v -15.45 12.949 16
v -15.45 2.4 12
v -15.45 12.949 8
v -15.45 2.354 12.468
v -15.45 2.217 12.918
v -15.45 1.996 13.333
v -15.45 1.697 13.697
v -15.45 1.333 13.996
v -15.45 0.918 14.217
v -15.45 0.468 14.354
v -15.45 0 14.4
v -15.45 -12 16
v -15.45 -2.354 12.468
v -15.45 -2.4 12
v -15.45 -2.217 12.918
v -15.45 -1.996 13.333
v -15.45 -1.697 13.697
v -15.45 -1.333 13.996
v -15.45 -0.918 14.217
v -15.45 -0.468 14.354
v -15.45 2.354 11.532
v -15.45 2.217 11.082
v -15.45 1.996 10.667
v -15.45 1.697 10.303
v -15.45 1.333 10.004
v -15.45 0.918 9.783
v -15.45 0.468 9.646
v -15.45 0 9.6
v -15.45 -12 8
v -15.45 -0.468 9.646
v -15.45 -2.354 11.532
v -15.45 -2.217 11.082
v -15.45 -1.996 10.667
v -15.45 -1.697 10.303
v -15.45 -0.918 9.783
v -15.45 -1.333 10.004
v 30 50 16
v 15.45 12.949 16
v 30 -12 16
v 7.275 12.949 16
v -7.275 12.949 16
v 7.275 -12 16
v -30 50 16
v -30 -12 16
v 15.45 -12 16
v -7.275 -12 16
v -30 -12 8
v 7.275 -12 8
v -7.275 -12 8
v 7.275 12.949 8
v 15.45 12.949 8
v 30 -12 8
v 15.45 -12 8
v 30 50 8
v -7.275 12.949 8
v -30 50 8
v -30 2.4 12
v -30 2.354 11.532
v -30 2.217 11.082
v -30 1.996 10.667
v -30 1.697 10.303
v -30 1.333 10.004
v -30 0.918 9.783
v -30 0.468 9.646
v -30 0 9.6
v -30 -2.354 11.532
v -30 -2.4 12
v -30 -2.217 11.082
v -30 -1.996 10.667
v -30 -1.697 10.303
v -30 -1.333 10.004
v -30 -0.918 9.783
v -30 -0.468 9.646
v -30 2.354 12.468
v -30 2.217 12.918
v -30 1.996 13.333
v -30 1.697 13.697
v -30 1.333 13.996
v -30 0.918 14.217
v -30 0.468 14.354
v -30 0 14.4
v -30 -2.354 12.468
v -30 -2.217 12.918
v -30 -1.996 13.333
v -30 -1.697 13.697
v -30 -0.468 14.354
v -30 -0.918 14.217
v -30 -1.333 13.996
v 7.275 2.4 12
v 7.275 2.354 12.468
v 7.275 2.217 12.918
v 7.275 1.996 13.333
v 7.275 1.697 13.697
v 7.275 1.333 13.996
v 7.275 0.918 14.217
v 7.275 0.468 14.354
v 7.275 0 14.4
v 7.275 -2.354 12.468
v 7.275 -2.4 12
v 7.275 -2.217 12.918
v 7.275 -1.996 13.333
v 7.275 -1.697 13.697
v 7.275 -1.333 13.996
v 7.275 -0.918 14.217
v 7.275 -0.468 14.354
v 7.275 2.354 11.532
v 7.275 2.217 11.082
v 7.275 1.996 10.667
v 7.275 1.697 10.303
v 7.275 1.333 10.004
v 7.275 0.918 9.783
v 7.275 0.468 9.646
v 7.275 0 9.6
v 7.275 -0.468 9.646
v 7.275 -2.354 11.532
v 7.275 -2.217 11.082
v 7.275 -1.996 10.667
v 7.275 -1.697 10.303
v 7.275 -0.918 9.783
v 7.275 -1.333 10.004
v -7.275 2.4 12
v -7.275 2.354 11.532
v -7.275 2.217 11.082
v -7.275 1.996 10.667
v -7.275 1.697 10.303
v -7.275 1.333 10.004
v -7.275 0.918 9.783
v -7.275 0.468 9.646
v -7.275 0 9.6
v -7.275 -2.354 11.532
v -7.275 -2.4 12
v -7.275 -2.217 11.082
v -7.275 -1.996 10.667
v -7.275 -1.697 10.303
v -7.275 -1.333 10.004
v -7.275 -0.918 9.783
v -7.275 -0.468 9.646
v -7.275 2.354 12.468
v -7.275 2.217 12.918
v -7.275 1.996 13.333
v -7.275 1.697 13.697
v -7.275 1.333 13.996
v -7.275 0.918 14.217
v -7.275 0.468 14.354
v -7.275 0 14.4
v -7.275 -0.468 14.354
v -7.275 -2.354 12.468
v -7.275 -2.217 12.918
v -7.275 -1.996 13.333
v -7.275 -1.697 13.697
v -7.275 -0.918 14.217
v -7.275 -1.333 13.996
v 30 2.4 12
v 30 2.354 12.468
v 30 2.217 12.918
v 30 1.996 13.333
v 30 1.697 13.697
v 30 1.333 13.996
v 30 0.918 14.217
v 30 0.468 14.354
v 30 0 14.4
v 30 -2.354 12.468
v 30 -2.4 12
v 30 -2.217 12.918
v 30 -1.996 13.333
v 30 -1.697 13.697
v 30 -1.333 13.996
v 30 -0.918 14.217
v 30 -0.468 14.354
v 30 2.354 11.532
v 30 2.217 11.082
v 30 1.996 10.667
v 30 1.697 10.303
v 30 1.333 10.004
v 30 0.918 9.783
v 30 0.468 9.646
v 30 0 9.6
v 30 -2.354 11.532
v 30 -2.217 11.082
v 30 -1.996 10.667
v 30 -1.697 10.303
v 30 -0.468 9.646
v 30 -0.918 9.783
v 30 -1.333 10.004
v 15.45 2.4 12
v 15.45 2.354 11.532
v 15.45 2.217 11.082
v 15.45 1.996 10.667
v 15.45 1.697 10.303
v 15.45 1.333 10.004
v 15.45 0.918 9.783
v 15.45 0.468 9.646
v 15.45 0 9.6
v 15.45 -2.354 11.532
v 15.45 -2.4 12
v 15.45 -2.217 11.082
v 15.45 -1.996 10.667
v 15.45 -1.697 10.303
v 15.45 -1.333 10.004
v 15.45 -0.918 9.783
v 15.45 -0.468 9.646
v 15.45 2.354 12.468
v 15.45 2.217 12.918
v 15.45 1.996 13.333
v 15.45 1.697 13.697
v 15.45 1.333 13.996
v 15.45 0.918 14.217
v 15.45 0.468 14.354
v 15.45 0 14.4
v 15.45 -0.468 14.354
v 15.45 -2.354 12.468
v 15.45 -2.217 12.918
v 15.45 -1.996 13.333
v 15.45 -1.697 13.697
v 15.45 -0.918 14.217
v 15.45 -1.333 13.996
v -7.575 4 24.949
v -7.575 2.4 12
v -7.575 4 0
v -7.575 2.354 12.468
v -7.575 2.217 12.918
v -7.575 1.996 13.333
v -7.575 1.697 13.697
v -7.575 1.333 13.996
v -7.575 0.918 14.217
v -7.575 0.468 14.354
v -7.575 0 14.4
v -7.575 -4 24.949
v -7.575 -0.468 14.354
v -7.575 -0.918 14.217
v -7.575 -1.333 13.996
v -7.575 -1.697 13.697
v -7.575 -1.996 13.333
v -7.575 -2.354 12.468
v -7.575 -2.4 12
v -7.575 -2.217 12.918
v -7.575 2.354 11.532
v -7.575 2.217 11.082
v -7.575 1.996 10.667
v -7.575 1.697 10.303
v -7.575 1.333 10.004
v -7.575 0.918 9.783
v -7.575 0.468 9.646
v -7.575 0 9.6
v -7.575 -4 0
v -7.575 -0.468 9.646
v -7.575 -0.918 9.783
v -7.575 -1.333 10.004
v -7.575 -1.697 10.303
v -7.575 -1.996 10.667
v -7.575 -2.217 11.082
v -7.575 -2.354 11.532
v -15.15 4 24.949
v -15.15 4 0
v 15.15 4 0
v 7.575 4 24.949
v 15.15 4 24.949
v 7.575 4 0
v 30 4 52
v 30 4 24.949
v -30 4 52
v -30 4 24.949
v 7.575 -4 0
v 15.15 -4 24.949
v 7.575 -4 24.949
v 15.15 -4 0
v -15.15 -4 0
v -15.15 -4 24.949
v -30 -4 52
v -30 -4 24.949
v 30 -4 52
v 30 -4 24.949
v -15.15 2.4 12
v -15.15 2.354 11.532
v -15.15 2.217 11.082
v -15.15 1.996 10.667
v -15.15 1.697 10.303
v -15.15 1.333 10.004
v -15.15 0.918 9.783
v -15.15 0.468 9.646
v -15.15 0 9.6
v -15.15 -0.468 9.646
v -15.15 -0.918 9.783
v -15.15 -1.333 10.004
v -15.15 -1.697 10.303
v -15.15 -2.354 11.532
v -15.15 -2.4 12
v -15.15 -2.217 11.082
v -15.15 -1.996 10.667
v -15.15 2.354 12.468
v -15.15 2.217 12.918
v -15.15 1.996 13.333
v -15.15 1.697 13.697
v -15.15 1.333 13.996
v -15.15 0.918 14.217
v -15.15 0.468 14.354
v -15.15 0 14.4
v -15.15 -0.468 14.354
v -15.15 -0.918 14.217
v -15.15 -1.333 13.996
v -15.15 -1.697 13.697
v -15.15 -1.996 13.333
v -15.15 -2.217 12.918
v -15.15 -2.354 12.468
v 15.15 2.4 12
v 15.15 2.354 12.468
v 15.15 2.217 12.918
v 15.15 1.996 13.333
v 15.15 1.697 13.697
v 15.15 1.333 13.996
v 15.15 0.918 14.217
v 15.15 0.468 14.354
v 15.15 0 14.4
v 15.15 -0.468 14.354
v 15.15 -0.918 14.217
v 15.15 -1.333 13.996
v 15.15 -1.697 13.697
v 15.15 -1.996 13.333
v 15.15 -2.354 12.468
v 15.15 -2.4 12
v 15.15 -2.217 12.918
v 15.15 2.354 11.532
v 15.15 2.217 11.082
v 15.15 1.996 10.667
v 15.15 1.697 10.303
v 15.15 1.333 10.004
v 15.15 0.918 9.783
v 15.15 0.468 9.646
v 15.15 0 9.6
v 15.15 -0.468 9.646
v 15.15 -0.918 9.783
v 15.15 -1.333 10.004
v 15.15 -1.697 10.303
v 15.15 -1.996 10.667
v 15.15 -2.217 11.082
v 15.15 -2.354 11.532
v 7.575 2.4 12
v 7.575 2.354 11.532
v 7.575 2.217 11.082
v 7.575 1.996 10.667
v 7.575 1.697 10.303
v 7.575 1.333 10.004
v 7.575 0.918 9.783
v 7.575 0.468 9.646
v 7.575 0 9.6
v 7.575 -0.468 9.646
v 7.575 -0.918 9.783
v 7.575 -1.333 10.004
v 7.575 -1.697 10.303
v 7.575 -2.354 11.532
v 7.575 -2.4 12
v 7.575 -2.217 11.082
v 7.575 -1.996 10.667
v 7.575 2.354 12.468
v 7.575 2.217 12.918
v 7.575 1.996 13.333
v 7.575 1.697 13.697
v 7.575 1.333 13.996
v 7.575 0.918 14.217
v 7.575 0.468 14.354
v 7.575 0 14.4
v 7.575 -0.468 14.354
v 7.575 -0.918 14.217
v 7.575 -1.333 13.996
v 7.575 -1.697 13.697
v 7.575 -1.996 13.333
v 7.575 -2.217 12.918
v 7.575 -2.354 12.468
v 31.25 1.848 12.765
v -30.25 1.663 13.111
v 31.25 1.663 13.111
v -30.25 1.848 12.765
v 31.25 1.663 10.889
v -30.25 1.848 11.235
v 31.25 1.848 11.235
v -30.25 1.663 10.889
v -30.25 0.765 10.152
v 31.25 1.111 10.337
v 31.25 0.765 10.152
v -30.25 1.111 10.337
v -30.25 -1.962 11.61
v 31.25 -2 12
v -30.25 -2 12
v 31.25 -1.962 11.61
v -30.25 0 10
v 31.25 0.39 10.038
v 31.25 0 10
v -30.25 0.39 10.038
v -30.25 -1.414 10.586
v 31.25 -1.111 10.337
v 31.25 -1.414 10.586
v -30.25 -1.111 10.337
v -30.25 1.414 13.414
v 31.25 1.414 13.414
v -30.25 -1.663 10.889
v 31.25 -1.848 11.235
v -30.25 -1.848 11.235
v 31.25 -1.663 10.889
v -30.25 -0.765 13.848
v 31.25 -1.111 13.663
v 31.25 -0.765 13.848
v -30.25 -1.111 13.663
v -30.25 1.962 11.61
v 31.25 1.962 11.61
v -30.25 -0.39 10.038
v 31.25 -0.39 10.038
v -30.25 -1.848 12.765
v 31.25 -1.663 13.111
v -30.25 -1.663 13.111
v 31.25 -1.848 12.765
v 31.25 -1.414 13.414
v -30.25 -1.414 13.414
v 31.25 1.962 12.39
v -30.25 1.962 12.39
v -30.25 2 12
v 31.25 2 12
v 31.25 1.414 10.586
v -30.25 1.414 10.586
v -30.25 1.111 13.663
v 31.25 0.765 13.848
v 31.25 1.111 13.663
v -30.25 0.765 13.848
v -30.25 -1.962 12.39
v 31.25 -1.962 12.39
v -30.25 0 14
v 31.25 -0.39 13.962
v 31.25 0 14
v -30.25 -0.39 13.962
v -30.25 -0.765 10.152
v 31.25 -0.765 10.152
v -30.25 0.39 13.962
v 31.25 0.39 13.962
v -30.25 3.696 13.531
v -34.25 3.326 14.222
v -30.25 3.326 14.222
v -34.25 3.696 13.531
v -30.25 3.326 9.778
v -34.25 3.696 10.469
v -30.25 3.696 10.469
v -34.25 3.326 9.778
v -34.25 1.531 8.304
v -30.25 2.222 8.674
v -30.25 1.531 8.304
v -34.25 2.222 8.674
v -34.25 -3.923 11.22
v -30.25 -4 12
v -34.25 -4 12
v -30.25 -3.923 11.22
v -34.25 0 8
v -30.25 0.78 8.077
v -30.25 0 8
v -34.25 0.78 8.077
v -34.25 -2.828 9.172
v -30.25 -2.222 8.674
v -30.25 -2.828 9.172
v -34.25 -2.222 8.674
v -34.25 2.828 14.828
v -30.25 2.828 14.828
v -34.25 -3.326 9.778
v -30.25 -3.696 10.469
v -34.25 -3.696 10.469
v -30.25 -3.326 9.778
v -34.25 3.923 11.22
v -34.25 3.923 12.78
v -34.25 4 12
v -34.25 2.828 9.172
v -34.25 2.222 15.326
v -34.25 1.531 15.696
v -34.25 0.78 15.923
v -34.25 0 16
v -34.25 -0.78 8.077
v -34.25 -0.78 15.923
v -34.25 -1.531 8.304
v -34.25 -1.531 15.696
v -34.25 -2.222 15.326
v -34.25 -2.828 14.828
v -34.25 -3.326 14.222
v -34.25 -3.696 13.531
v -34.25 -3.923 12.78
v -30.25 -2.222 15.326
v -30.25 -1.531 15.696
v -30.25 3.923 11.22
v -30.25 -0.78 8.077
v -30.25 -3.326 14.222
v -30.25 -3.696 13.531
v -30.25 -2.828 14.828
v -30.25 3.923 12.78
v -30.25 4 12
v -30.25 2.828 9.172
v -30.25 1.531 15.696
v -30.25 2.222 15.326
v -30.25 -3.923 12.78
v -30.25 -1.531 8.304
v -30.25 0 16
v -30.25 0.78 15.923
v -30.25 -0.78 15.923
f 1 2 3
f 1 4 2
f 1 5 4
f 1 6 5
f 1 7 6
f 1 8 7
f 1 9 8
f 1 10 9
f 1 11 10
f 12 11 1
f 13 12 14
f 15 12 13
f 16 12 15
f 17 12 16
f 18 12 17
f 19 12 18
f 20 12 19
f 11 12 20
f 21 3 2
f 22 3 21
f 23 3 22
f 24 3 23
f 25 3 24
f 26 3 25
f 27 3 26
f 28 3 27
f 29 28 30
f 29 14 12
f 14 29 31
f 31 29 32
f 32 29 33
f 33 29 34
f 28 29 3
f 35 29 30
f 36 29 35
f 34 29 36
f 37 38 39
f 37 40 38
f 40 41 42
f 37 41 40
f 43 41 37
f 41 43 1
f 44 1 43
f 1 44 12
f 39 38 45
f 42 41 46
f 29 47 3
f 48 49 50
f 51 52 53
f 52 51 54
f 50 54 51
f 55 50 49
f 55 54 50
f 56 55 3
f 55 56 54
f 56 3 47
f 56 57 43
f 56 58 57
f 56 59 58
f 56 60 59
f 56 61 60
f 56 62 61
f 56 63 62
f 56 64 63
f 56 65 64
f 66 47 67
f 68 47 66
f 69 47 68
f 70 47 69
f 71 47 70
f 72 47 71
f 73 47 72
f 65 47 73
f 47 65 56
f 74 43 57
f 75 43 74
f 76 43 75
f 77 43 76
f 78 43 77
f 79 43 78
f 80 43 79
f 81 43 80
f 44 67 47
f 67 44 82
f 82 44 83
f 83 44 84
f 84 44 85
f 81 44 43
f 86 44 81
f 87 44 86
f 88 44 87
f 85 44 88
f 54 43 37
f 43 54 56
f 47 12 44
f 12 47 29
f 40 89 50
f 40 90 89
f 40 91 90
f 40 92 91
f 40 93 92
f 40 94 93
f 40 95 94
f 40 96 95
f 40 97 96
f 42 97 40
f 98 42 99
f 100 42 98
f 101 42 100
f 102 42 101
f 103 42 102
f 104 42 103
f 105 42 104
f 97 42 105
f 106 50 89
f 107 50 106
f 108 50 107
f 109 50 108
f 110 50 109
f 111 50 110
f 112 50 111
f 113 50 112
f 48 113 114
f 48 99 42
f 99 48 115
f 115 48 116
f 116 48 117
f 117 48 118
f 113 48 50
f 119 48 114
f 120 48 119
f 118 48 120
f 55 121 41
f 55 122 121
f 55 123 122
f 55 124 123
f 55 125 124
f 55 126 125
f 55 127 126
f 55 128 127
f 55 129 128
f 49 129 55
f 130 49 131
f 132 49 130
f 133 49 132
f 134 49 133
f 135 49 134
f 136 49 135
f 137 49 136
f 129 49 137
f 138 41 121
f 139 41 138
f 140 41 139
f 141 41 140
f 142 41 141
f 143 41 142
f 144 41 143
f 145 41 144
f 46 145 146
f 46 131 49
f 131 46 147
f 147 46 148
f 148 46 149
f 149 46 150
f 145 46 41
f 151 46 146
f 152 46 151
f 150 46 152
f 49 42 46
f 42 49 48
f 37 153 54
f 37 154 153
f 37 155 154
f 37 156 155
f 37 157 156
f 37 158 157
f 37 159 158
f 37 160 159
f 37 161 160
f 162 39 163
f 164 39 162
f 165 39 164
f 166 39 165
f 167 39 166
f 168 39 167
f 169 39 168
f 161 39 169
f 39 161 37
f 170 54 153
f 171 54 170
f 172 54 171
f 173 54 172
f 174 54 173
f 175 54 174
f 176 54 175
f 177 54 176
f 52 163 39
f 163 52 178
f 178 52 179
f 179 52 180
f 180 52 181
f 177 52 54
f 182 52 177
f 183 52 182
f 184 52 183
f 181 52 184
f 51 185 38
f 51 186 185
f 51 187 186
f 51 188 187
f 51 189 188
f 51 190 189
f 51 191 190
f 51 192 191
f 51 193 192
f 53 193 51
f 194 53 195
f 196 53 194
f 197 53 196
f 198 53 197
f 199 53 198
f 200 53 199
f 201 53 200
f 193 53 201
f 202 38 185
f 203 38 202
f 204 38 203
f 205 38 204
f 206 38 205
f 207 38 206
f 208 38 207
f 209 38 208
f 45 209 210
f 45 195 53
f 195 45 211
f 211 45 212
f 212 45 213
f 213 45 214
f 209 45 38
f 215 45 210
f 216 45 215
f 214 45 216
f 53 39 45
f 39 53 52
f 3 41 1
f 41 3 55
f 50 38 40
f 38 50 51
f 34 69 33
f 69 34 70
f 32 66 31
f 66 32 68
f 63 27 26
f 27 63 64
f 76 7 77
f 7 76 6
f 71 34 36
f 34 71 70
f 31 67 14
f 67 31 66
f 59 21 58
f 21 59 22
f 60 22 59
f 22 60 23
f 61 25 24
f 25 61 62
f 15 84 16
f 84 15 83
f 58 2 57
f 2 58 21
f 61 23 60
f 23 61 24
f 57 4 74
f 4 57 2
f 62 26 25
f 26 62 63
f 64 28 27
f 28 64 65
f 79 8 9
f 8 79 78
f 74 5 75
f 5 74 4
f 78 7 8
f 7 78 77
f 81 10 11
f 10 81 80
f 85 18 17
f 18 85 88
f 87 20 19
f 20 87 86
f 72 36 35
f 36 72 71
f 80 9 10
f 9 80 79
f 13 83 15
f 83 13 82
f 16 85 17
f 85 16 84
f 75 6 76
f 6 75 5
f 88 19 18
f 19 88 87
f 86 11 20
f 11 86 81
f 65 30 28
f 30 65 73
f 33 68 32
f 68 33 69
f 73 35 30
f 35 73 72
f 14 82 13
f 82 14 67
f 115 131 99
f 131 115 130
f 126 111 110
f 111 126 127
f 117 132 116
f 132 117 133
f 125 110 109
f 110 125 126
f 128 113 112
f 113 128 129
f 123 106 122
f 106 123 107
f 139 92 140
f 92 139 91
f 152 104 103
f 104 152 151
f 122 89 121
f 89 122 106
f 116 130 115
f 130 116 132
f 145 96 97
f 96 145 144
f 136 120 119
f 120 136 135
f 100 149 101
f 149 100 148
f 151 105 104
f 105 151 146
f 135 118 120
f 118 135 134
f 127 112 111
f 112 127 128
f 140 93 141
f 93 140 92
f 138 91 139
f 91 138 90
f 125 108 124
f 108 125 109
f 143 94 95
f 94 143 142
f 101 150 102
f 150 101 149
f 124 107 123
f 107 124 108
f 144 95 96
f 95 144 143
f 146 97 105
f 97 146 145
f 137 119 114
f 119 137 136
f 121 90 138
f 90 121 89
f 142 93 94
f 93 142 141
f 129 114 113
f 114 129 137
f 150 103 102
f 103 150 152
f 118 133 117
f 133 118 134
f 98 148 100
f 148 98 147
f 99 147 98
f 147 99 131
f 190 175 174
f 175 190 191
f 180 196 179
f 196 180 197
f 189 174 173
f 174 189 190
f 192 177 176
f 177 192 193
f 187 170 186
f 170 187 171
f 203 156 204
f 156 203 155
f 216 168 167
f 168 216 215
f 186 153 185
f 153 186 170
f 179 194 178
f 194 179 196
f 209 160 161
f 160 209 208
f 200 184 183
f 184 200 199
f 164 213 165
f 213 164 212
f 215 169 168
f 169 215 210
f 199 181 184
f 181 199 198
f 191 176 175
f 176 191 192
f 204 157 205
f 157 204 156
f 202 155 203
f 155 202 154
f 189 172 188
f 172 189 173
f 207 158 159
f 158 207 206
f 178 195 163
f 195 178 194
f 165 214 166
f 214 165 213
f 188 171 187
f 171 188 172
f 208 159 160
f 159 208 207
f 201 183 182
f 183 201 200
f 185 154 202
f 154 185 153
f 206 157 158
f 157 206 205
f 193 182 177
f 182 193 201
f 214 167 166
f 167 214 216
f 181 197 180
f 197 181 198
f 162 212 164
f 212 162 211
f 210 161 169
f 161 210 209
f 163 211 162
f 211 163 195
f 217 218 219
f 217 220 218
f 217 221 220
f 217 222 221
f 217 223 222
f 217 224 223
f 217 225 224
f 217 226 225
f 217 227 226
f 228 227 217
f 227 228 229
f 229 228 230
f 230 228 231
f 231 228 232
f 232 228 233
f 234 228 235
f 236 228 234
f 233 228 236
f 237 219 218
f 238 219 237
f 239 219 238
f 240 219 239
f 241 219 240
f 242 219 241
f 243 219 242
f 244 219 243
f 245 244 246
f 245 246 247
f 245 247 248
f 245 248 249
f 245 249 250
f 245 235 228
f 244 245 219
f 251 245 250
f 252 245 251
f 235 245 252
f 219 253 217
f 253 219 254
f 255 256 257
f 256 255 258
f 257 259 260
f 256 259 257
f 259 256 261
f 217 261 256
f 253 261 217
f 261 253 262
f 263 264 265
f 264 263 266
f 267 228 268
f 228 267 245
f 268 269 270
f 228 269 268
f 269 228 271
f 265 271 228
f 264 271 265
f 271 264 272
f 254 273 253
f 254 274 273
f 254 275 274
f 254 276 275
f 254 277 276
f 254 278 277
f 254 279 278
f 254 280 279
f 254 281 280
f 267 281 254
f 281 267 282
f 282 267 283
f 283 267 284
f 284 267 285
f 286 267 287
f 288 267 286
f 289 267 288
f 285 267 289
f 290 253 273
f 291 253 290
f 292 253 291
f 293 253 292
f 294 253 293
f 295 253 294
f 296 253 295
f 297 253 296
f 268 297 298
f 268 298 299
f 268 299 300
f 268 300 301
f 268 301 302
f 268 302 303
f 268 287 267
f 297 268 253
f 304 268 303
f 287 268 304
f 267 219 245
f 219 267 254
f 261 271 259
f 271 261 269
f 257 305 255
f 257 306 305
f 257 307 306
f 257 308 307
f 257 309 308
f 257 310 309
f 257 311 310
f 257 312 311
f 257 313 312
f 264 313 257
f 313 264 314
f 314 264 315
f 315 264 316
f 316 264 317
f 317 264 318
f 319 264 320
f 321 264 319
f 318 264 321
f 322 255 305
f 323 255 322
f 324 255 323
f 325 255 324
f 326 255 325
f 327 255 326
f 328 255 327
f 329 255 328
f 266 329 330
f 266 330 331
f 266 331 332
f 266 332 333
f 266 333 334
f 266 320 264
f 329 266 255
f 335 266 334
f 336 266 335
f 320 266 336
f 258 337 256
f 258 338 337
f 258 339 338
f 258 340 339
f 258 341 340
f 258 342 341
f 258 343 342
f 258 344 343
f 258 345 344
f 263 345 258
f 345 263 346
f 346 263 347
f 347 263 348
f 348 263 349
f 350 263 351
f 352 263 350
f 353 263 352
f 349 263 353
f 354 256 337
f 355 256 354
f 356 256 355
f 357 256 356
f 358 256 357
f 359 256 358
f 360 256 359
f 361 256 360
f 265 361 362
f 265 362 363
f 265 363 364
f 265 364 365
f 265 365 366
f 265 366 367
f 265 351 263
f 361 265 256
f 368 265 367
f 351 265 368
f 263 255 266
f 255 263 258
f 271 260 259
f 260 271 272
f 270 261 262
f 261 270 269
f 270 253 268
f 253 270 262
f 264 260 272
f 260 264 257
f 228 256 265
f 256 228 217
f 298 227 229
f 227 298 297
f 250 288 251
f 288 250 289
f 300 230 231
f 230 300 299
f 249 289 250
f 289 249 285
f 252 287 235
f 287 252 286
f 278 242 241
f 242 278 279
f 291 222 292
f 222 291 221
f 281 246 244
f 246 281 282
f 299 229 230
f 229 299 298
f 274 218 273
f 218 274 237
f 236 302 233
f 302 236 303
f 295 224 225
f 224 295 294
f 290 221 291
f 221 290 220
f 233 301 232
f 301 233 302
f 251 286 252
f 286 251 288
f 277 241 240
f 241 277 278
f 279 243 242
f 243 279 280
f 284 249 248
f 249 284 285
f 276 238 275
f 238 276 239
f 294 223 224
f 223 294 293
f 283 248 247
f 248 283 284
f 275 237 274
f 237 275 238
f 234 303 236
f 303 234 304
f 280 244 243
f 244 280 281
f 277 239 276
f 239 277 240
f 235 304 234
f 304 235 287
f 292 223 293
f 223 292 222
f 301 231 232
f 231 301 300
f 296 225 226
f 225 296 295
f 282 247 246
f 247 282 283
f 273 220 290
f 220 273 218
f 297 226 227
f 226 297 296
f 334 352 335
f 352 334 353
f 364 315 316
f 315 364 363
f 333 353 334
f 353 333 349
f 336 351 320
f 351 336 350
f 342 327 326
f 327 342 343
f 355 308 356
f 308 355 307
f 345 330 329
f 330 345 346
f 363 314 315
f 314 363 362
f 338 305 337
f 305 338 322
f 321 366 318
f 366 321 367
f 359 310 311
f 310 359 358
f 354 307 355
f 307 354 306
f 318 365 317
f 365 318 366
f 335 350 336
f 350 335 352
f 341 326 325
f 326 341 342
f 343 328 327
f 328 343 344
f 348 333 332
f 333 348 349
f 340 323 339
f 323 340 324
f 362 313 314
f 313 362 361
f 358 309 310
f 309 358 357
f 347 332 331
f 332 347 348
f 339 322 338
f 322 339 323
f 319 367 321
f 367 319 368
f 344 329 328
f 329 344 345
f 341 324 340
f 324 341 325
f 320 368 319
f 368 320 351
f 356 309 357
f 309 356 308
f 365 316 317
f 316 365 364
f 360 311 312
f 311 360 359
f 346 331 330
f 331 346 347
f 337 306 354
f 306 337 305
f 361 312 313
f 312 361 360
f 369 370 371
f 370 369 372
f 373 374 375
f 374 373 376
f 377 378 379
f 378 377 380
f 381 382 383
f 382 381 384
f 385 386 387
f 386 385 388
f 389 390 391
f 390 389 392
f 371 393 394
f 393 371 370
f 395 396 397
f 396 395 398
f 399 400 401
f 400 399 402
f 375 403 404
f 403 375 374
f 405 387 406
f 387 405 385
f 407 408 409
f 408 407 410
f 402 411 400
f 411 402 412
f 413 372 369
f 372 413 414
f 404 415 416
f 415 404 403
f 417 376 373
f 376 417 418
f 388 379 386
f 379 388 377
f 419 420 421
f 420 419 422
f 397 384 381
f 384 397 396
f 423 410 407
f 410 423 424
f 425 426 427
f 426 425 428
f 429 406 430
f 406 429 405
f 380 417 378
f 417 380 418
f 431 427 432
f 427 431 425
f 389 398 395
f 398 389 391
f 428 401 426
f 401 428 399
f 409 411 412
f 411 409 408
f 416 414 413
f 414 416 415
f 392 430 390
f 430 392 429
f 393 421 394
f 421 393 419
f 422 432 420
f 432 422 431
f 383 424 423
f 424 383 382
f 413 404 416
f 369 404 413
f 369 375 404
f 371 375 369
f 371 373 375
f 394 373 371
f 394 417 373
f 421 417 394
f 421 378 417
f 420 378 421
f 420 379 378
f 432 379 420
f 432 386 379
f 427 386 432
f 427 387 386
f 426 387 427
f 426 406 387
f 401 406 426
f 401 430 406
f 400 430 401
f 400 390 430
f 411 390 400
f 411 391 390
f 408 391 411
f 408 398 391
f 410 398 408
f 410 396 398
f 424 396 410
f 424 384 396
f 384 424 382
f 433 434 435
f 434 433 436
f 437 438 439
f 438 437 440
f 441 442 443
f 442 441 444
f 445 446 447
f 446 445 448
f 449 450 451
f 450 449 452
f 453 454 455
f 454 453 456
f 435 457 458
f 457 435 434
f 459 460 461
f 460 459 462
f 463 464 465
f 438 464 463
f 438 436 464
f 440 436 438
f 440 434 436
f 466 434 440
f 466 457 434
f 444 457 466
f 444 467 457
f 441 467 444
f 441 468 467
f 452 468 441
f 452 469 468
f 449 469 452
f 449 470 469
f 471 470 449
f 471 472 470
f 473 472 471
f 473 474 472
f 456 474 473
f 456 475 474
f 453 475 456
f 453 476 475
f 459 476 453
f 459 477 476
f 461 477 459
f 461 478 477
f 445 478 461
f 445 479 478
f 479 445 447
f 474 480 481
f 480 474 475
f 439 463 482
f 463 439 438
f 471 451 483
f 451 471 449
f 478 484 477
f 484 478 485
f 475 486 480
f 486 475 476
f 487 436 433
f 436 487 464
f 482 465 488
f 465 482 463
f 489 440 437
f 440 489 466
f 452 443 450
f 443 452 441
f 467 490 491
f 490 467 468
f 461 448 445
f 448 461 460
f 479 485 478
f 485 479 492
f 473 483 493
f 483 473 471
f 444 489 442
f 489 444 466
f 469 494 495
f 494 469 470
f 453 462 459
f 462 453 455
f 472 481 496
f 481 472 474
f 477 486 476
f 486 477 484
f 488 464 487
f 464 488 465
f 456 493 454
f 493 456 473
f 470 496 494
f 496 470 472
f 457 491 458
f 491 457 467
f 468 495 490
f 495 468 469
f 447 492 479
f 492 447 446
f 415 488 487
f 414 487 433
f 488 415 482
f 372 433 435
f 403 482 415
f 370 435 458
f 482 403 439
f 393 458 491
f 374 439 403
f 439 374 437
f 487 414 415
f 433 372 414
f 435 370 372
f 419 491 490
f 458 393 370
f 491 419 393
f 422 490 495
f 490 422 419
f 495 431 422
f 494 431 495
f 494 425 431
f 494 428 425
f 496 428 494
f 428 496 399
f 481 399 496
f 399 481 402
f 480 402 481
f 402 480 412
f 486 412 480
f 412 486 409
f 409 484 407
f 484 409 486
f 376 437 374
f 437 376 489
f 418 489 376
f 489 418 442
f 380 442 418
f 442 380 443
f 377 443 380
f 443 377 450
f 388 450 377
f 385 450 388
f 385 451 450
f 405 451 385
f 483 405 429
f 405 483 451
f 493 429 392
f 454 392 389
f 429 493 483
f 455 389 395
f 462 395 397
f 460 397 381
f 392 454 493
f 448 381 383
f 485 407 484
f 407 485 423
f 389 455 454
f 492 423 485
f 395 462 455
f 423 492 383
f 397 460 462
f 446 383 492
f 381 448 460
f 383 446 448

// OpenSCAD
$fn = 32;

// ------------------------------------------------------------------------
// Butt hinge: hinge 60 mm, leaf swung 270 deg
// Every part is its own module, assembly() places every instance.
// ------------------------------------------------------------------------

// --- part 1 ---
module hinge_base() {
  difference() {
    union() {
      translate([-30, -12, -4]) cube([14.55, 62, 8]);
      translate([-7.275, -12, -4]) cube([14.55, 62, 8]);
      translate([15.45, -12, -4]) cube([14.55, 62, 8]);
      translate([-30, 12.949, -4]) cube([60, 37.051, 8]);
    }
    translate([-22.725, 0, 0]) rotate([0, 90, 0]) cylinder(h = 16.55, d = 4.8, center = true);
    translate([0, 0, 0]) rotate([0, 90, 0]) cylinder(h = 16.55, d = 4.8, center = true);
    translate([22.725, 0, 0]) rotate([0, 90, 0]) cylinder(h = 16.55, d = 4.8, center = true);
  }
}

// --- part 2 ---
module hinge_mover() {
  difference() {
    union() {
      translate([-15.15, -40, -4]) cube([7.575, 52, 8]);
      translate([7.575, -40, -4]) cube([7.575, 52, 8]);
      translate([-30, -40, -4]) cube([60, 27.051, 8]);
    }
    translate([-11.362, 0, 0]) rotate([0, 90, 0]) cylinder(h = 9.575, d = 4.8, center = true);
    translate([11.362, 0, 0]) rotate([0, 90, 0]) cylinder(h = 9.575, d = 4.8, center = true);
  }
}

// --- part 3 ---
module hinge_pin() {
  rotate([0, 90, 0]) cylinder(h = 62.5, d = 4, center = true);
  translate([-34.25, 0, 0]) rotate([0, 90, 0]) cylinder(h = 4, d = 8);
}

// --- assembly ---
module assembly() {
  color([0.80, 0.24, 0.20]) translate([0, 0, 12]) rotate([0, 0, 0]) hinge_base();
  color([0.20, 0.45, 0.75]) translate([0, 0, 12]) rotate([270, 0, 0]) hinge_mover();
  color([0.25, 0.62, 0.32]) translate([0, 0, 12]) rotate([0, 0, 0]) hinge_pin();
}

assembly();
